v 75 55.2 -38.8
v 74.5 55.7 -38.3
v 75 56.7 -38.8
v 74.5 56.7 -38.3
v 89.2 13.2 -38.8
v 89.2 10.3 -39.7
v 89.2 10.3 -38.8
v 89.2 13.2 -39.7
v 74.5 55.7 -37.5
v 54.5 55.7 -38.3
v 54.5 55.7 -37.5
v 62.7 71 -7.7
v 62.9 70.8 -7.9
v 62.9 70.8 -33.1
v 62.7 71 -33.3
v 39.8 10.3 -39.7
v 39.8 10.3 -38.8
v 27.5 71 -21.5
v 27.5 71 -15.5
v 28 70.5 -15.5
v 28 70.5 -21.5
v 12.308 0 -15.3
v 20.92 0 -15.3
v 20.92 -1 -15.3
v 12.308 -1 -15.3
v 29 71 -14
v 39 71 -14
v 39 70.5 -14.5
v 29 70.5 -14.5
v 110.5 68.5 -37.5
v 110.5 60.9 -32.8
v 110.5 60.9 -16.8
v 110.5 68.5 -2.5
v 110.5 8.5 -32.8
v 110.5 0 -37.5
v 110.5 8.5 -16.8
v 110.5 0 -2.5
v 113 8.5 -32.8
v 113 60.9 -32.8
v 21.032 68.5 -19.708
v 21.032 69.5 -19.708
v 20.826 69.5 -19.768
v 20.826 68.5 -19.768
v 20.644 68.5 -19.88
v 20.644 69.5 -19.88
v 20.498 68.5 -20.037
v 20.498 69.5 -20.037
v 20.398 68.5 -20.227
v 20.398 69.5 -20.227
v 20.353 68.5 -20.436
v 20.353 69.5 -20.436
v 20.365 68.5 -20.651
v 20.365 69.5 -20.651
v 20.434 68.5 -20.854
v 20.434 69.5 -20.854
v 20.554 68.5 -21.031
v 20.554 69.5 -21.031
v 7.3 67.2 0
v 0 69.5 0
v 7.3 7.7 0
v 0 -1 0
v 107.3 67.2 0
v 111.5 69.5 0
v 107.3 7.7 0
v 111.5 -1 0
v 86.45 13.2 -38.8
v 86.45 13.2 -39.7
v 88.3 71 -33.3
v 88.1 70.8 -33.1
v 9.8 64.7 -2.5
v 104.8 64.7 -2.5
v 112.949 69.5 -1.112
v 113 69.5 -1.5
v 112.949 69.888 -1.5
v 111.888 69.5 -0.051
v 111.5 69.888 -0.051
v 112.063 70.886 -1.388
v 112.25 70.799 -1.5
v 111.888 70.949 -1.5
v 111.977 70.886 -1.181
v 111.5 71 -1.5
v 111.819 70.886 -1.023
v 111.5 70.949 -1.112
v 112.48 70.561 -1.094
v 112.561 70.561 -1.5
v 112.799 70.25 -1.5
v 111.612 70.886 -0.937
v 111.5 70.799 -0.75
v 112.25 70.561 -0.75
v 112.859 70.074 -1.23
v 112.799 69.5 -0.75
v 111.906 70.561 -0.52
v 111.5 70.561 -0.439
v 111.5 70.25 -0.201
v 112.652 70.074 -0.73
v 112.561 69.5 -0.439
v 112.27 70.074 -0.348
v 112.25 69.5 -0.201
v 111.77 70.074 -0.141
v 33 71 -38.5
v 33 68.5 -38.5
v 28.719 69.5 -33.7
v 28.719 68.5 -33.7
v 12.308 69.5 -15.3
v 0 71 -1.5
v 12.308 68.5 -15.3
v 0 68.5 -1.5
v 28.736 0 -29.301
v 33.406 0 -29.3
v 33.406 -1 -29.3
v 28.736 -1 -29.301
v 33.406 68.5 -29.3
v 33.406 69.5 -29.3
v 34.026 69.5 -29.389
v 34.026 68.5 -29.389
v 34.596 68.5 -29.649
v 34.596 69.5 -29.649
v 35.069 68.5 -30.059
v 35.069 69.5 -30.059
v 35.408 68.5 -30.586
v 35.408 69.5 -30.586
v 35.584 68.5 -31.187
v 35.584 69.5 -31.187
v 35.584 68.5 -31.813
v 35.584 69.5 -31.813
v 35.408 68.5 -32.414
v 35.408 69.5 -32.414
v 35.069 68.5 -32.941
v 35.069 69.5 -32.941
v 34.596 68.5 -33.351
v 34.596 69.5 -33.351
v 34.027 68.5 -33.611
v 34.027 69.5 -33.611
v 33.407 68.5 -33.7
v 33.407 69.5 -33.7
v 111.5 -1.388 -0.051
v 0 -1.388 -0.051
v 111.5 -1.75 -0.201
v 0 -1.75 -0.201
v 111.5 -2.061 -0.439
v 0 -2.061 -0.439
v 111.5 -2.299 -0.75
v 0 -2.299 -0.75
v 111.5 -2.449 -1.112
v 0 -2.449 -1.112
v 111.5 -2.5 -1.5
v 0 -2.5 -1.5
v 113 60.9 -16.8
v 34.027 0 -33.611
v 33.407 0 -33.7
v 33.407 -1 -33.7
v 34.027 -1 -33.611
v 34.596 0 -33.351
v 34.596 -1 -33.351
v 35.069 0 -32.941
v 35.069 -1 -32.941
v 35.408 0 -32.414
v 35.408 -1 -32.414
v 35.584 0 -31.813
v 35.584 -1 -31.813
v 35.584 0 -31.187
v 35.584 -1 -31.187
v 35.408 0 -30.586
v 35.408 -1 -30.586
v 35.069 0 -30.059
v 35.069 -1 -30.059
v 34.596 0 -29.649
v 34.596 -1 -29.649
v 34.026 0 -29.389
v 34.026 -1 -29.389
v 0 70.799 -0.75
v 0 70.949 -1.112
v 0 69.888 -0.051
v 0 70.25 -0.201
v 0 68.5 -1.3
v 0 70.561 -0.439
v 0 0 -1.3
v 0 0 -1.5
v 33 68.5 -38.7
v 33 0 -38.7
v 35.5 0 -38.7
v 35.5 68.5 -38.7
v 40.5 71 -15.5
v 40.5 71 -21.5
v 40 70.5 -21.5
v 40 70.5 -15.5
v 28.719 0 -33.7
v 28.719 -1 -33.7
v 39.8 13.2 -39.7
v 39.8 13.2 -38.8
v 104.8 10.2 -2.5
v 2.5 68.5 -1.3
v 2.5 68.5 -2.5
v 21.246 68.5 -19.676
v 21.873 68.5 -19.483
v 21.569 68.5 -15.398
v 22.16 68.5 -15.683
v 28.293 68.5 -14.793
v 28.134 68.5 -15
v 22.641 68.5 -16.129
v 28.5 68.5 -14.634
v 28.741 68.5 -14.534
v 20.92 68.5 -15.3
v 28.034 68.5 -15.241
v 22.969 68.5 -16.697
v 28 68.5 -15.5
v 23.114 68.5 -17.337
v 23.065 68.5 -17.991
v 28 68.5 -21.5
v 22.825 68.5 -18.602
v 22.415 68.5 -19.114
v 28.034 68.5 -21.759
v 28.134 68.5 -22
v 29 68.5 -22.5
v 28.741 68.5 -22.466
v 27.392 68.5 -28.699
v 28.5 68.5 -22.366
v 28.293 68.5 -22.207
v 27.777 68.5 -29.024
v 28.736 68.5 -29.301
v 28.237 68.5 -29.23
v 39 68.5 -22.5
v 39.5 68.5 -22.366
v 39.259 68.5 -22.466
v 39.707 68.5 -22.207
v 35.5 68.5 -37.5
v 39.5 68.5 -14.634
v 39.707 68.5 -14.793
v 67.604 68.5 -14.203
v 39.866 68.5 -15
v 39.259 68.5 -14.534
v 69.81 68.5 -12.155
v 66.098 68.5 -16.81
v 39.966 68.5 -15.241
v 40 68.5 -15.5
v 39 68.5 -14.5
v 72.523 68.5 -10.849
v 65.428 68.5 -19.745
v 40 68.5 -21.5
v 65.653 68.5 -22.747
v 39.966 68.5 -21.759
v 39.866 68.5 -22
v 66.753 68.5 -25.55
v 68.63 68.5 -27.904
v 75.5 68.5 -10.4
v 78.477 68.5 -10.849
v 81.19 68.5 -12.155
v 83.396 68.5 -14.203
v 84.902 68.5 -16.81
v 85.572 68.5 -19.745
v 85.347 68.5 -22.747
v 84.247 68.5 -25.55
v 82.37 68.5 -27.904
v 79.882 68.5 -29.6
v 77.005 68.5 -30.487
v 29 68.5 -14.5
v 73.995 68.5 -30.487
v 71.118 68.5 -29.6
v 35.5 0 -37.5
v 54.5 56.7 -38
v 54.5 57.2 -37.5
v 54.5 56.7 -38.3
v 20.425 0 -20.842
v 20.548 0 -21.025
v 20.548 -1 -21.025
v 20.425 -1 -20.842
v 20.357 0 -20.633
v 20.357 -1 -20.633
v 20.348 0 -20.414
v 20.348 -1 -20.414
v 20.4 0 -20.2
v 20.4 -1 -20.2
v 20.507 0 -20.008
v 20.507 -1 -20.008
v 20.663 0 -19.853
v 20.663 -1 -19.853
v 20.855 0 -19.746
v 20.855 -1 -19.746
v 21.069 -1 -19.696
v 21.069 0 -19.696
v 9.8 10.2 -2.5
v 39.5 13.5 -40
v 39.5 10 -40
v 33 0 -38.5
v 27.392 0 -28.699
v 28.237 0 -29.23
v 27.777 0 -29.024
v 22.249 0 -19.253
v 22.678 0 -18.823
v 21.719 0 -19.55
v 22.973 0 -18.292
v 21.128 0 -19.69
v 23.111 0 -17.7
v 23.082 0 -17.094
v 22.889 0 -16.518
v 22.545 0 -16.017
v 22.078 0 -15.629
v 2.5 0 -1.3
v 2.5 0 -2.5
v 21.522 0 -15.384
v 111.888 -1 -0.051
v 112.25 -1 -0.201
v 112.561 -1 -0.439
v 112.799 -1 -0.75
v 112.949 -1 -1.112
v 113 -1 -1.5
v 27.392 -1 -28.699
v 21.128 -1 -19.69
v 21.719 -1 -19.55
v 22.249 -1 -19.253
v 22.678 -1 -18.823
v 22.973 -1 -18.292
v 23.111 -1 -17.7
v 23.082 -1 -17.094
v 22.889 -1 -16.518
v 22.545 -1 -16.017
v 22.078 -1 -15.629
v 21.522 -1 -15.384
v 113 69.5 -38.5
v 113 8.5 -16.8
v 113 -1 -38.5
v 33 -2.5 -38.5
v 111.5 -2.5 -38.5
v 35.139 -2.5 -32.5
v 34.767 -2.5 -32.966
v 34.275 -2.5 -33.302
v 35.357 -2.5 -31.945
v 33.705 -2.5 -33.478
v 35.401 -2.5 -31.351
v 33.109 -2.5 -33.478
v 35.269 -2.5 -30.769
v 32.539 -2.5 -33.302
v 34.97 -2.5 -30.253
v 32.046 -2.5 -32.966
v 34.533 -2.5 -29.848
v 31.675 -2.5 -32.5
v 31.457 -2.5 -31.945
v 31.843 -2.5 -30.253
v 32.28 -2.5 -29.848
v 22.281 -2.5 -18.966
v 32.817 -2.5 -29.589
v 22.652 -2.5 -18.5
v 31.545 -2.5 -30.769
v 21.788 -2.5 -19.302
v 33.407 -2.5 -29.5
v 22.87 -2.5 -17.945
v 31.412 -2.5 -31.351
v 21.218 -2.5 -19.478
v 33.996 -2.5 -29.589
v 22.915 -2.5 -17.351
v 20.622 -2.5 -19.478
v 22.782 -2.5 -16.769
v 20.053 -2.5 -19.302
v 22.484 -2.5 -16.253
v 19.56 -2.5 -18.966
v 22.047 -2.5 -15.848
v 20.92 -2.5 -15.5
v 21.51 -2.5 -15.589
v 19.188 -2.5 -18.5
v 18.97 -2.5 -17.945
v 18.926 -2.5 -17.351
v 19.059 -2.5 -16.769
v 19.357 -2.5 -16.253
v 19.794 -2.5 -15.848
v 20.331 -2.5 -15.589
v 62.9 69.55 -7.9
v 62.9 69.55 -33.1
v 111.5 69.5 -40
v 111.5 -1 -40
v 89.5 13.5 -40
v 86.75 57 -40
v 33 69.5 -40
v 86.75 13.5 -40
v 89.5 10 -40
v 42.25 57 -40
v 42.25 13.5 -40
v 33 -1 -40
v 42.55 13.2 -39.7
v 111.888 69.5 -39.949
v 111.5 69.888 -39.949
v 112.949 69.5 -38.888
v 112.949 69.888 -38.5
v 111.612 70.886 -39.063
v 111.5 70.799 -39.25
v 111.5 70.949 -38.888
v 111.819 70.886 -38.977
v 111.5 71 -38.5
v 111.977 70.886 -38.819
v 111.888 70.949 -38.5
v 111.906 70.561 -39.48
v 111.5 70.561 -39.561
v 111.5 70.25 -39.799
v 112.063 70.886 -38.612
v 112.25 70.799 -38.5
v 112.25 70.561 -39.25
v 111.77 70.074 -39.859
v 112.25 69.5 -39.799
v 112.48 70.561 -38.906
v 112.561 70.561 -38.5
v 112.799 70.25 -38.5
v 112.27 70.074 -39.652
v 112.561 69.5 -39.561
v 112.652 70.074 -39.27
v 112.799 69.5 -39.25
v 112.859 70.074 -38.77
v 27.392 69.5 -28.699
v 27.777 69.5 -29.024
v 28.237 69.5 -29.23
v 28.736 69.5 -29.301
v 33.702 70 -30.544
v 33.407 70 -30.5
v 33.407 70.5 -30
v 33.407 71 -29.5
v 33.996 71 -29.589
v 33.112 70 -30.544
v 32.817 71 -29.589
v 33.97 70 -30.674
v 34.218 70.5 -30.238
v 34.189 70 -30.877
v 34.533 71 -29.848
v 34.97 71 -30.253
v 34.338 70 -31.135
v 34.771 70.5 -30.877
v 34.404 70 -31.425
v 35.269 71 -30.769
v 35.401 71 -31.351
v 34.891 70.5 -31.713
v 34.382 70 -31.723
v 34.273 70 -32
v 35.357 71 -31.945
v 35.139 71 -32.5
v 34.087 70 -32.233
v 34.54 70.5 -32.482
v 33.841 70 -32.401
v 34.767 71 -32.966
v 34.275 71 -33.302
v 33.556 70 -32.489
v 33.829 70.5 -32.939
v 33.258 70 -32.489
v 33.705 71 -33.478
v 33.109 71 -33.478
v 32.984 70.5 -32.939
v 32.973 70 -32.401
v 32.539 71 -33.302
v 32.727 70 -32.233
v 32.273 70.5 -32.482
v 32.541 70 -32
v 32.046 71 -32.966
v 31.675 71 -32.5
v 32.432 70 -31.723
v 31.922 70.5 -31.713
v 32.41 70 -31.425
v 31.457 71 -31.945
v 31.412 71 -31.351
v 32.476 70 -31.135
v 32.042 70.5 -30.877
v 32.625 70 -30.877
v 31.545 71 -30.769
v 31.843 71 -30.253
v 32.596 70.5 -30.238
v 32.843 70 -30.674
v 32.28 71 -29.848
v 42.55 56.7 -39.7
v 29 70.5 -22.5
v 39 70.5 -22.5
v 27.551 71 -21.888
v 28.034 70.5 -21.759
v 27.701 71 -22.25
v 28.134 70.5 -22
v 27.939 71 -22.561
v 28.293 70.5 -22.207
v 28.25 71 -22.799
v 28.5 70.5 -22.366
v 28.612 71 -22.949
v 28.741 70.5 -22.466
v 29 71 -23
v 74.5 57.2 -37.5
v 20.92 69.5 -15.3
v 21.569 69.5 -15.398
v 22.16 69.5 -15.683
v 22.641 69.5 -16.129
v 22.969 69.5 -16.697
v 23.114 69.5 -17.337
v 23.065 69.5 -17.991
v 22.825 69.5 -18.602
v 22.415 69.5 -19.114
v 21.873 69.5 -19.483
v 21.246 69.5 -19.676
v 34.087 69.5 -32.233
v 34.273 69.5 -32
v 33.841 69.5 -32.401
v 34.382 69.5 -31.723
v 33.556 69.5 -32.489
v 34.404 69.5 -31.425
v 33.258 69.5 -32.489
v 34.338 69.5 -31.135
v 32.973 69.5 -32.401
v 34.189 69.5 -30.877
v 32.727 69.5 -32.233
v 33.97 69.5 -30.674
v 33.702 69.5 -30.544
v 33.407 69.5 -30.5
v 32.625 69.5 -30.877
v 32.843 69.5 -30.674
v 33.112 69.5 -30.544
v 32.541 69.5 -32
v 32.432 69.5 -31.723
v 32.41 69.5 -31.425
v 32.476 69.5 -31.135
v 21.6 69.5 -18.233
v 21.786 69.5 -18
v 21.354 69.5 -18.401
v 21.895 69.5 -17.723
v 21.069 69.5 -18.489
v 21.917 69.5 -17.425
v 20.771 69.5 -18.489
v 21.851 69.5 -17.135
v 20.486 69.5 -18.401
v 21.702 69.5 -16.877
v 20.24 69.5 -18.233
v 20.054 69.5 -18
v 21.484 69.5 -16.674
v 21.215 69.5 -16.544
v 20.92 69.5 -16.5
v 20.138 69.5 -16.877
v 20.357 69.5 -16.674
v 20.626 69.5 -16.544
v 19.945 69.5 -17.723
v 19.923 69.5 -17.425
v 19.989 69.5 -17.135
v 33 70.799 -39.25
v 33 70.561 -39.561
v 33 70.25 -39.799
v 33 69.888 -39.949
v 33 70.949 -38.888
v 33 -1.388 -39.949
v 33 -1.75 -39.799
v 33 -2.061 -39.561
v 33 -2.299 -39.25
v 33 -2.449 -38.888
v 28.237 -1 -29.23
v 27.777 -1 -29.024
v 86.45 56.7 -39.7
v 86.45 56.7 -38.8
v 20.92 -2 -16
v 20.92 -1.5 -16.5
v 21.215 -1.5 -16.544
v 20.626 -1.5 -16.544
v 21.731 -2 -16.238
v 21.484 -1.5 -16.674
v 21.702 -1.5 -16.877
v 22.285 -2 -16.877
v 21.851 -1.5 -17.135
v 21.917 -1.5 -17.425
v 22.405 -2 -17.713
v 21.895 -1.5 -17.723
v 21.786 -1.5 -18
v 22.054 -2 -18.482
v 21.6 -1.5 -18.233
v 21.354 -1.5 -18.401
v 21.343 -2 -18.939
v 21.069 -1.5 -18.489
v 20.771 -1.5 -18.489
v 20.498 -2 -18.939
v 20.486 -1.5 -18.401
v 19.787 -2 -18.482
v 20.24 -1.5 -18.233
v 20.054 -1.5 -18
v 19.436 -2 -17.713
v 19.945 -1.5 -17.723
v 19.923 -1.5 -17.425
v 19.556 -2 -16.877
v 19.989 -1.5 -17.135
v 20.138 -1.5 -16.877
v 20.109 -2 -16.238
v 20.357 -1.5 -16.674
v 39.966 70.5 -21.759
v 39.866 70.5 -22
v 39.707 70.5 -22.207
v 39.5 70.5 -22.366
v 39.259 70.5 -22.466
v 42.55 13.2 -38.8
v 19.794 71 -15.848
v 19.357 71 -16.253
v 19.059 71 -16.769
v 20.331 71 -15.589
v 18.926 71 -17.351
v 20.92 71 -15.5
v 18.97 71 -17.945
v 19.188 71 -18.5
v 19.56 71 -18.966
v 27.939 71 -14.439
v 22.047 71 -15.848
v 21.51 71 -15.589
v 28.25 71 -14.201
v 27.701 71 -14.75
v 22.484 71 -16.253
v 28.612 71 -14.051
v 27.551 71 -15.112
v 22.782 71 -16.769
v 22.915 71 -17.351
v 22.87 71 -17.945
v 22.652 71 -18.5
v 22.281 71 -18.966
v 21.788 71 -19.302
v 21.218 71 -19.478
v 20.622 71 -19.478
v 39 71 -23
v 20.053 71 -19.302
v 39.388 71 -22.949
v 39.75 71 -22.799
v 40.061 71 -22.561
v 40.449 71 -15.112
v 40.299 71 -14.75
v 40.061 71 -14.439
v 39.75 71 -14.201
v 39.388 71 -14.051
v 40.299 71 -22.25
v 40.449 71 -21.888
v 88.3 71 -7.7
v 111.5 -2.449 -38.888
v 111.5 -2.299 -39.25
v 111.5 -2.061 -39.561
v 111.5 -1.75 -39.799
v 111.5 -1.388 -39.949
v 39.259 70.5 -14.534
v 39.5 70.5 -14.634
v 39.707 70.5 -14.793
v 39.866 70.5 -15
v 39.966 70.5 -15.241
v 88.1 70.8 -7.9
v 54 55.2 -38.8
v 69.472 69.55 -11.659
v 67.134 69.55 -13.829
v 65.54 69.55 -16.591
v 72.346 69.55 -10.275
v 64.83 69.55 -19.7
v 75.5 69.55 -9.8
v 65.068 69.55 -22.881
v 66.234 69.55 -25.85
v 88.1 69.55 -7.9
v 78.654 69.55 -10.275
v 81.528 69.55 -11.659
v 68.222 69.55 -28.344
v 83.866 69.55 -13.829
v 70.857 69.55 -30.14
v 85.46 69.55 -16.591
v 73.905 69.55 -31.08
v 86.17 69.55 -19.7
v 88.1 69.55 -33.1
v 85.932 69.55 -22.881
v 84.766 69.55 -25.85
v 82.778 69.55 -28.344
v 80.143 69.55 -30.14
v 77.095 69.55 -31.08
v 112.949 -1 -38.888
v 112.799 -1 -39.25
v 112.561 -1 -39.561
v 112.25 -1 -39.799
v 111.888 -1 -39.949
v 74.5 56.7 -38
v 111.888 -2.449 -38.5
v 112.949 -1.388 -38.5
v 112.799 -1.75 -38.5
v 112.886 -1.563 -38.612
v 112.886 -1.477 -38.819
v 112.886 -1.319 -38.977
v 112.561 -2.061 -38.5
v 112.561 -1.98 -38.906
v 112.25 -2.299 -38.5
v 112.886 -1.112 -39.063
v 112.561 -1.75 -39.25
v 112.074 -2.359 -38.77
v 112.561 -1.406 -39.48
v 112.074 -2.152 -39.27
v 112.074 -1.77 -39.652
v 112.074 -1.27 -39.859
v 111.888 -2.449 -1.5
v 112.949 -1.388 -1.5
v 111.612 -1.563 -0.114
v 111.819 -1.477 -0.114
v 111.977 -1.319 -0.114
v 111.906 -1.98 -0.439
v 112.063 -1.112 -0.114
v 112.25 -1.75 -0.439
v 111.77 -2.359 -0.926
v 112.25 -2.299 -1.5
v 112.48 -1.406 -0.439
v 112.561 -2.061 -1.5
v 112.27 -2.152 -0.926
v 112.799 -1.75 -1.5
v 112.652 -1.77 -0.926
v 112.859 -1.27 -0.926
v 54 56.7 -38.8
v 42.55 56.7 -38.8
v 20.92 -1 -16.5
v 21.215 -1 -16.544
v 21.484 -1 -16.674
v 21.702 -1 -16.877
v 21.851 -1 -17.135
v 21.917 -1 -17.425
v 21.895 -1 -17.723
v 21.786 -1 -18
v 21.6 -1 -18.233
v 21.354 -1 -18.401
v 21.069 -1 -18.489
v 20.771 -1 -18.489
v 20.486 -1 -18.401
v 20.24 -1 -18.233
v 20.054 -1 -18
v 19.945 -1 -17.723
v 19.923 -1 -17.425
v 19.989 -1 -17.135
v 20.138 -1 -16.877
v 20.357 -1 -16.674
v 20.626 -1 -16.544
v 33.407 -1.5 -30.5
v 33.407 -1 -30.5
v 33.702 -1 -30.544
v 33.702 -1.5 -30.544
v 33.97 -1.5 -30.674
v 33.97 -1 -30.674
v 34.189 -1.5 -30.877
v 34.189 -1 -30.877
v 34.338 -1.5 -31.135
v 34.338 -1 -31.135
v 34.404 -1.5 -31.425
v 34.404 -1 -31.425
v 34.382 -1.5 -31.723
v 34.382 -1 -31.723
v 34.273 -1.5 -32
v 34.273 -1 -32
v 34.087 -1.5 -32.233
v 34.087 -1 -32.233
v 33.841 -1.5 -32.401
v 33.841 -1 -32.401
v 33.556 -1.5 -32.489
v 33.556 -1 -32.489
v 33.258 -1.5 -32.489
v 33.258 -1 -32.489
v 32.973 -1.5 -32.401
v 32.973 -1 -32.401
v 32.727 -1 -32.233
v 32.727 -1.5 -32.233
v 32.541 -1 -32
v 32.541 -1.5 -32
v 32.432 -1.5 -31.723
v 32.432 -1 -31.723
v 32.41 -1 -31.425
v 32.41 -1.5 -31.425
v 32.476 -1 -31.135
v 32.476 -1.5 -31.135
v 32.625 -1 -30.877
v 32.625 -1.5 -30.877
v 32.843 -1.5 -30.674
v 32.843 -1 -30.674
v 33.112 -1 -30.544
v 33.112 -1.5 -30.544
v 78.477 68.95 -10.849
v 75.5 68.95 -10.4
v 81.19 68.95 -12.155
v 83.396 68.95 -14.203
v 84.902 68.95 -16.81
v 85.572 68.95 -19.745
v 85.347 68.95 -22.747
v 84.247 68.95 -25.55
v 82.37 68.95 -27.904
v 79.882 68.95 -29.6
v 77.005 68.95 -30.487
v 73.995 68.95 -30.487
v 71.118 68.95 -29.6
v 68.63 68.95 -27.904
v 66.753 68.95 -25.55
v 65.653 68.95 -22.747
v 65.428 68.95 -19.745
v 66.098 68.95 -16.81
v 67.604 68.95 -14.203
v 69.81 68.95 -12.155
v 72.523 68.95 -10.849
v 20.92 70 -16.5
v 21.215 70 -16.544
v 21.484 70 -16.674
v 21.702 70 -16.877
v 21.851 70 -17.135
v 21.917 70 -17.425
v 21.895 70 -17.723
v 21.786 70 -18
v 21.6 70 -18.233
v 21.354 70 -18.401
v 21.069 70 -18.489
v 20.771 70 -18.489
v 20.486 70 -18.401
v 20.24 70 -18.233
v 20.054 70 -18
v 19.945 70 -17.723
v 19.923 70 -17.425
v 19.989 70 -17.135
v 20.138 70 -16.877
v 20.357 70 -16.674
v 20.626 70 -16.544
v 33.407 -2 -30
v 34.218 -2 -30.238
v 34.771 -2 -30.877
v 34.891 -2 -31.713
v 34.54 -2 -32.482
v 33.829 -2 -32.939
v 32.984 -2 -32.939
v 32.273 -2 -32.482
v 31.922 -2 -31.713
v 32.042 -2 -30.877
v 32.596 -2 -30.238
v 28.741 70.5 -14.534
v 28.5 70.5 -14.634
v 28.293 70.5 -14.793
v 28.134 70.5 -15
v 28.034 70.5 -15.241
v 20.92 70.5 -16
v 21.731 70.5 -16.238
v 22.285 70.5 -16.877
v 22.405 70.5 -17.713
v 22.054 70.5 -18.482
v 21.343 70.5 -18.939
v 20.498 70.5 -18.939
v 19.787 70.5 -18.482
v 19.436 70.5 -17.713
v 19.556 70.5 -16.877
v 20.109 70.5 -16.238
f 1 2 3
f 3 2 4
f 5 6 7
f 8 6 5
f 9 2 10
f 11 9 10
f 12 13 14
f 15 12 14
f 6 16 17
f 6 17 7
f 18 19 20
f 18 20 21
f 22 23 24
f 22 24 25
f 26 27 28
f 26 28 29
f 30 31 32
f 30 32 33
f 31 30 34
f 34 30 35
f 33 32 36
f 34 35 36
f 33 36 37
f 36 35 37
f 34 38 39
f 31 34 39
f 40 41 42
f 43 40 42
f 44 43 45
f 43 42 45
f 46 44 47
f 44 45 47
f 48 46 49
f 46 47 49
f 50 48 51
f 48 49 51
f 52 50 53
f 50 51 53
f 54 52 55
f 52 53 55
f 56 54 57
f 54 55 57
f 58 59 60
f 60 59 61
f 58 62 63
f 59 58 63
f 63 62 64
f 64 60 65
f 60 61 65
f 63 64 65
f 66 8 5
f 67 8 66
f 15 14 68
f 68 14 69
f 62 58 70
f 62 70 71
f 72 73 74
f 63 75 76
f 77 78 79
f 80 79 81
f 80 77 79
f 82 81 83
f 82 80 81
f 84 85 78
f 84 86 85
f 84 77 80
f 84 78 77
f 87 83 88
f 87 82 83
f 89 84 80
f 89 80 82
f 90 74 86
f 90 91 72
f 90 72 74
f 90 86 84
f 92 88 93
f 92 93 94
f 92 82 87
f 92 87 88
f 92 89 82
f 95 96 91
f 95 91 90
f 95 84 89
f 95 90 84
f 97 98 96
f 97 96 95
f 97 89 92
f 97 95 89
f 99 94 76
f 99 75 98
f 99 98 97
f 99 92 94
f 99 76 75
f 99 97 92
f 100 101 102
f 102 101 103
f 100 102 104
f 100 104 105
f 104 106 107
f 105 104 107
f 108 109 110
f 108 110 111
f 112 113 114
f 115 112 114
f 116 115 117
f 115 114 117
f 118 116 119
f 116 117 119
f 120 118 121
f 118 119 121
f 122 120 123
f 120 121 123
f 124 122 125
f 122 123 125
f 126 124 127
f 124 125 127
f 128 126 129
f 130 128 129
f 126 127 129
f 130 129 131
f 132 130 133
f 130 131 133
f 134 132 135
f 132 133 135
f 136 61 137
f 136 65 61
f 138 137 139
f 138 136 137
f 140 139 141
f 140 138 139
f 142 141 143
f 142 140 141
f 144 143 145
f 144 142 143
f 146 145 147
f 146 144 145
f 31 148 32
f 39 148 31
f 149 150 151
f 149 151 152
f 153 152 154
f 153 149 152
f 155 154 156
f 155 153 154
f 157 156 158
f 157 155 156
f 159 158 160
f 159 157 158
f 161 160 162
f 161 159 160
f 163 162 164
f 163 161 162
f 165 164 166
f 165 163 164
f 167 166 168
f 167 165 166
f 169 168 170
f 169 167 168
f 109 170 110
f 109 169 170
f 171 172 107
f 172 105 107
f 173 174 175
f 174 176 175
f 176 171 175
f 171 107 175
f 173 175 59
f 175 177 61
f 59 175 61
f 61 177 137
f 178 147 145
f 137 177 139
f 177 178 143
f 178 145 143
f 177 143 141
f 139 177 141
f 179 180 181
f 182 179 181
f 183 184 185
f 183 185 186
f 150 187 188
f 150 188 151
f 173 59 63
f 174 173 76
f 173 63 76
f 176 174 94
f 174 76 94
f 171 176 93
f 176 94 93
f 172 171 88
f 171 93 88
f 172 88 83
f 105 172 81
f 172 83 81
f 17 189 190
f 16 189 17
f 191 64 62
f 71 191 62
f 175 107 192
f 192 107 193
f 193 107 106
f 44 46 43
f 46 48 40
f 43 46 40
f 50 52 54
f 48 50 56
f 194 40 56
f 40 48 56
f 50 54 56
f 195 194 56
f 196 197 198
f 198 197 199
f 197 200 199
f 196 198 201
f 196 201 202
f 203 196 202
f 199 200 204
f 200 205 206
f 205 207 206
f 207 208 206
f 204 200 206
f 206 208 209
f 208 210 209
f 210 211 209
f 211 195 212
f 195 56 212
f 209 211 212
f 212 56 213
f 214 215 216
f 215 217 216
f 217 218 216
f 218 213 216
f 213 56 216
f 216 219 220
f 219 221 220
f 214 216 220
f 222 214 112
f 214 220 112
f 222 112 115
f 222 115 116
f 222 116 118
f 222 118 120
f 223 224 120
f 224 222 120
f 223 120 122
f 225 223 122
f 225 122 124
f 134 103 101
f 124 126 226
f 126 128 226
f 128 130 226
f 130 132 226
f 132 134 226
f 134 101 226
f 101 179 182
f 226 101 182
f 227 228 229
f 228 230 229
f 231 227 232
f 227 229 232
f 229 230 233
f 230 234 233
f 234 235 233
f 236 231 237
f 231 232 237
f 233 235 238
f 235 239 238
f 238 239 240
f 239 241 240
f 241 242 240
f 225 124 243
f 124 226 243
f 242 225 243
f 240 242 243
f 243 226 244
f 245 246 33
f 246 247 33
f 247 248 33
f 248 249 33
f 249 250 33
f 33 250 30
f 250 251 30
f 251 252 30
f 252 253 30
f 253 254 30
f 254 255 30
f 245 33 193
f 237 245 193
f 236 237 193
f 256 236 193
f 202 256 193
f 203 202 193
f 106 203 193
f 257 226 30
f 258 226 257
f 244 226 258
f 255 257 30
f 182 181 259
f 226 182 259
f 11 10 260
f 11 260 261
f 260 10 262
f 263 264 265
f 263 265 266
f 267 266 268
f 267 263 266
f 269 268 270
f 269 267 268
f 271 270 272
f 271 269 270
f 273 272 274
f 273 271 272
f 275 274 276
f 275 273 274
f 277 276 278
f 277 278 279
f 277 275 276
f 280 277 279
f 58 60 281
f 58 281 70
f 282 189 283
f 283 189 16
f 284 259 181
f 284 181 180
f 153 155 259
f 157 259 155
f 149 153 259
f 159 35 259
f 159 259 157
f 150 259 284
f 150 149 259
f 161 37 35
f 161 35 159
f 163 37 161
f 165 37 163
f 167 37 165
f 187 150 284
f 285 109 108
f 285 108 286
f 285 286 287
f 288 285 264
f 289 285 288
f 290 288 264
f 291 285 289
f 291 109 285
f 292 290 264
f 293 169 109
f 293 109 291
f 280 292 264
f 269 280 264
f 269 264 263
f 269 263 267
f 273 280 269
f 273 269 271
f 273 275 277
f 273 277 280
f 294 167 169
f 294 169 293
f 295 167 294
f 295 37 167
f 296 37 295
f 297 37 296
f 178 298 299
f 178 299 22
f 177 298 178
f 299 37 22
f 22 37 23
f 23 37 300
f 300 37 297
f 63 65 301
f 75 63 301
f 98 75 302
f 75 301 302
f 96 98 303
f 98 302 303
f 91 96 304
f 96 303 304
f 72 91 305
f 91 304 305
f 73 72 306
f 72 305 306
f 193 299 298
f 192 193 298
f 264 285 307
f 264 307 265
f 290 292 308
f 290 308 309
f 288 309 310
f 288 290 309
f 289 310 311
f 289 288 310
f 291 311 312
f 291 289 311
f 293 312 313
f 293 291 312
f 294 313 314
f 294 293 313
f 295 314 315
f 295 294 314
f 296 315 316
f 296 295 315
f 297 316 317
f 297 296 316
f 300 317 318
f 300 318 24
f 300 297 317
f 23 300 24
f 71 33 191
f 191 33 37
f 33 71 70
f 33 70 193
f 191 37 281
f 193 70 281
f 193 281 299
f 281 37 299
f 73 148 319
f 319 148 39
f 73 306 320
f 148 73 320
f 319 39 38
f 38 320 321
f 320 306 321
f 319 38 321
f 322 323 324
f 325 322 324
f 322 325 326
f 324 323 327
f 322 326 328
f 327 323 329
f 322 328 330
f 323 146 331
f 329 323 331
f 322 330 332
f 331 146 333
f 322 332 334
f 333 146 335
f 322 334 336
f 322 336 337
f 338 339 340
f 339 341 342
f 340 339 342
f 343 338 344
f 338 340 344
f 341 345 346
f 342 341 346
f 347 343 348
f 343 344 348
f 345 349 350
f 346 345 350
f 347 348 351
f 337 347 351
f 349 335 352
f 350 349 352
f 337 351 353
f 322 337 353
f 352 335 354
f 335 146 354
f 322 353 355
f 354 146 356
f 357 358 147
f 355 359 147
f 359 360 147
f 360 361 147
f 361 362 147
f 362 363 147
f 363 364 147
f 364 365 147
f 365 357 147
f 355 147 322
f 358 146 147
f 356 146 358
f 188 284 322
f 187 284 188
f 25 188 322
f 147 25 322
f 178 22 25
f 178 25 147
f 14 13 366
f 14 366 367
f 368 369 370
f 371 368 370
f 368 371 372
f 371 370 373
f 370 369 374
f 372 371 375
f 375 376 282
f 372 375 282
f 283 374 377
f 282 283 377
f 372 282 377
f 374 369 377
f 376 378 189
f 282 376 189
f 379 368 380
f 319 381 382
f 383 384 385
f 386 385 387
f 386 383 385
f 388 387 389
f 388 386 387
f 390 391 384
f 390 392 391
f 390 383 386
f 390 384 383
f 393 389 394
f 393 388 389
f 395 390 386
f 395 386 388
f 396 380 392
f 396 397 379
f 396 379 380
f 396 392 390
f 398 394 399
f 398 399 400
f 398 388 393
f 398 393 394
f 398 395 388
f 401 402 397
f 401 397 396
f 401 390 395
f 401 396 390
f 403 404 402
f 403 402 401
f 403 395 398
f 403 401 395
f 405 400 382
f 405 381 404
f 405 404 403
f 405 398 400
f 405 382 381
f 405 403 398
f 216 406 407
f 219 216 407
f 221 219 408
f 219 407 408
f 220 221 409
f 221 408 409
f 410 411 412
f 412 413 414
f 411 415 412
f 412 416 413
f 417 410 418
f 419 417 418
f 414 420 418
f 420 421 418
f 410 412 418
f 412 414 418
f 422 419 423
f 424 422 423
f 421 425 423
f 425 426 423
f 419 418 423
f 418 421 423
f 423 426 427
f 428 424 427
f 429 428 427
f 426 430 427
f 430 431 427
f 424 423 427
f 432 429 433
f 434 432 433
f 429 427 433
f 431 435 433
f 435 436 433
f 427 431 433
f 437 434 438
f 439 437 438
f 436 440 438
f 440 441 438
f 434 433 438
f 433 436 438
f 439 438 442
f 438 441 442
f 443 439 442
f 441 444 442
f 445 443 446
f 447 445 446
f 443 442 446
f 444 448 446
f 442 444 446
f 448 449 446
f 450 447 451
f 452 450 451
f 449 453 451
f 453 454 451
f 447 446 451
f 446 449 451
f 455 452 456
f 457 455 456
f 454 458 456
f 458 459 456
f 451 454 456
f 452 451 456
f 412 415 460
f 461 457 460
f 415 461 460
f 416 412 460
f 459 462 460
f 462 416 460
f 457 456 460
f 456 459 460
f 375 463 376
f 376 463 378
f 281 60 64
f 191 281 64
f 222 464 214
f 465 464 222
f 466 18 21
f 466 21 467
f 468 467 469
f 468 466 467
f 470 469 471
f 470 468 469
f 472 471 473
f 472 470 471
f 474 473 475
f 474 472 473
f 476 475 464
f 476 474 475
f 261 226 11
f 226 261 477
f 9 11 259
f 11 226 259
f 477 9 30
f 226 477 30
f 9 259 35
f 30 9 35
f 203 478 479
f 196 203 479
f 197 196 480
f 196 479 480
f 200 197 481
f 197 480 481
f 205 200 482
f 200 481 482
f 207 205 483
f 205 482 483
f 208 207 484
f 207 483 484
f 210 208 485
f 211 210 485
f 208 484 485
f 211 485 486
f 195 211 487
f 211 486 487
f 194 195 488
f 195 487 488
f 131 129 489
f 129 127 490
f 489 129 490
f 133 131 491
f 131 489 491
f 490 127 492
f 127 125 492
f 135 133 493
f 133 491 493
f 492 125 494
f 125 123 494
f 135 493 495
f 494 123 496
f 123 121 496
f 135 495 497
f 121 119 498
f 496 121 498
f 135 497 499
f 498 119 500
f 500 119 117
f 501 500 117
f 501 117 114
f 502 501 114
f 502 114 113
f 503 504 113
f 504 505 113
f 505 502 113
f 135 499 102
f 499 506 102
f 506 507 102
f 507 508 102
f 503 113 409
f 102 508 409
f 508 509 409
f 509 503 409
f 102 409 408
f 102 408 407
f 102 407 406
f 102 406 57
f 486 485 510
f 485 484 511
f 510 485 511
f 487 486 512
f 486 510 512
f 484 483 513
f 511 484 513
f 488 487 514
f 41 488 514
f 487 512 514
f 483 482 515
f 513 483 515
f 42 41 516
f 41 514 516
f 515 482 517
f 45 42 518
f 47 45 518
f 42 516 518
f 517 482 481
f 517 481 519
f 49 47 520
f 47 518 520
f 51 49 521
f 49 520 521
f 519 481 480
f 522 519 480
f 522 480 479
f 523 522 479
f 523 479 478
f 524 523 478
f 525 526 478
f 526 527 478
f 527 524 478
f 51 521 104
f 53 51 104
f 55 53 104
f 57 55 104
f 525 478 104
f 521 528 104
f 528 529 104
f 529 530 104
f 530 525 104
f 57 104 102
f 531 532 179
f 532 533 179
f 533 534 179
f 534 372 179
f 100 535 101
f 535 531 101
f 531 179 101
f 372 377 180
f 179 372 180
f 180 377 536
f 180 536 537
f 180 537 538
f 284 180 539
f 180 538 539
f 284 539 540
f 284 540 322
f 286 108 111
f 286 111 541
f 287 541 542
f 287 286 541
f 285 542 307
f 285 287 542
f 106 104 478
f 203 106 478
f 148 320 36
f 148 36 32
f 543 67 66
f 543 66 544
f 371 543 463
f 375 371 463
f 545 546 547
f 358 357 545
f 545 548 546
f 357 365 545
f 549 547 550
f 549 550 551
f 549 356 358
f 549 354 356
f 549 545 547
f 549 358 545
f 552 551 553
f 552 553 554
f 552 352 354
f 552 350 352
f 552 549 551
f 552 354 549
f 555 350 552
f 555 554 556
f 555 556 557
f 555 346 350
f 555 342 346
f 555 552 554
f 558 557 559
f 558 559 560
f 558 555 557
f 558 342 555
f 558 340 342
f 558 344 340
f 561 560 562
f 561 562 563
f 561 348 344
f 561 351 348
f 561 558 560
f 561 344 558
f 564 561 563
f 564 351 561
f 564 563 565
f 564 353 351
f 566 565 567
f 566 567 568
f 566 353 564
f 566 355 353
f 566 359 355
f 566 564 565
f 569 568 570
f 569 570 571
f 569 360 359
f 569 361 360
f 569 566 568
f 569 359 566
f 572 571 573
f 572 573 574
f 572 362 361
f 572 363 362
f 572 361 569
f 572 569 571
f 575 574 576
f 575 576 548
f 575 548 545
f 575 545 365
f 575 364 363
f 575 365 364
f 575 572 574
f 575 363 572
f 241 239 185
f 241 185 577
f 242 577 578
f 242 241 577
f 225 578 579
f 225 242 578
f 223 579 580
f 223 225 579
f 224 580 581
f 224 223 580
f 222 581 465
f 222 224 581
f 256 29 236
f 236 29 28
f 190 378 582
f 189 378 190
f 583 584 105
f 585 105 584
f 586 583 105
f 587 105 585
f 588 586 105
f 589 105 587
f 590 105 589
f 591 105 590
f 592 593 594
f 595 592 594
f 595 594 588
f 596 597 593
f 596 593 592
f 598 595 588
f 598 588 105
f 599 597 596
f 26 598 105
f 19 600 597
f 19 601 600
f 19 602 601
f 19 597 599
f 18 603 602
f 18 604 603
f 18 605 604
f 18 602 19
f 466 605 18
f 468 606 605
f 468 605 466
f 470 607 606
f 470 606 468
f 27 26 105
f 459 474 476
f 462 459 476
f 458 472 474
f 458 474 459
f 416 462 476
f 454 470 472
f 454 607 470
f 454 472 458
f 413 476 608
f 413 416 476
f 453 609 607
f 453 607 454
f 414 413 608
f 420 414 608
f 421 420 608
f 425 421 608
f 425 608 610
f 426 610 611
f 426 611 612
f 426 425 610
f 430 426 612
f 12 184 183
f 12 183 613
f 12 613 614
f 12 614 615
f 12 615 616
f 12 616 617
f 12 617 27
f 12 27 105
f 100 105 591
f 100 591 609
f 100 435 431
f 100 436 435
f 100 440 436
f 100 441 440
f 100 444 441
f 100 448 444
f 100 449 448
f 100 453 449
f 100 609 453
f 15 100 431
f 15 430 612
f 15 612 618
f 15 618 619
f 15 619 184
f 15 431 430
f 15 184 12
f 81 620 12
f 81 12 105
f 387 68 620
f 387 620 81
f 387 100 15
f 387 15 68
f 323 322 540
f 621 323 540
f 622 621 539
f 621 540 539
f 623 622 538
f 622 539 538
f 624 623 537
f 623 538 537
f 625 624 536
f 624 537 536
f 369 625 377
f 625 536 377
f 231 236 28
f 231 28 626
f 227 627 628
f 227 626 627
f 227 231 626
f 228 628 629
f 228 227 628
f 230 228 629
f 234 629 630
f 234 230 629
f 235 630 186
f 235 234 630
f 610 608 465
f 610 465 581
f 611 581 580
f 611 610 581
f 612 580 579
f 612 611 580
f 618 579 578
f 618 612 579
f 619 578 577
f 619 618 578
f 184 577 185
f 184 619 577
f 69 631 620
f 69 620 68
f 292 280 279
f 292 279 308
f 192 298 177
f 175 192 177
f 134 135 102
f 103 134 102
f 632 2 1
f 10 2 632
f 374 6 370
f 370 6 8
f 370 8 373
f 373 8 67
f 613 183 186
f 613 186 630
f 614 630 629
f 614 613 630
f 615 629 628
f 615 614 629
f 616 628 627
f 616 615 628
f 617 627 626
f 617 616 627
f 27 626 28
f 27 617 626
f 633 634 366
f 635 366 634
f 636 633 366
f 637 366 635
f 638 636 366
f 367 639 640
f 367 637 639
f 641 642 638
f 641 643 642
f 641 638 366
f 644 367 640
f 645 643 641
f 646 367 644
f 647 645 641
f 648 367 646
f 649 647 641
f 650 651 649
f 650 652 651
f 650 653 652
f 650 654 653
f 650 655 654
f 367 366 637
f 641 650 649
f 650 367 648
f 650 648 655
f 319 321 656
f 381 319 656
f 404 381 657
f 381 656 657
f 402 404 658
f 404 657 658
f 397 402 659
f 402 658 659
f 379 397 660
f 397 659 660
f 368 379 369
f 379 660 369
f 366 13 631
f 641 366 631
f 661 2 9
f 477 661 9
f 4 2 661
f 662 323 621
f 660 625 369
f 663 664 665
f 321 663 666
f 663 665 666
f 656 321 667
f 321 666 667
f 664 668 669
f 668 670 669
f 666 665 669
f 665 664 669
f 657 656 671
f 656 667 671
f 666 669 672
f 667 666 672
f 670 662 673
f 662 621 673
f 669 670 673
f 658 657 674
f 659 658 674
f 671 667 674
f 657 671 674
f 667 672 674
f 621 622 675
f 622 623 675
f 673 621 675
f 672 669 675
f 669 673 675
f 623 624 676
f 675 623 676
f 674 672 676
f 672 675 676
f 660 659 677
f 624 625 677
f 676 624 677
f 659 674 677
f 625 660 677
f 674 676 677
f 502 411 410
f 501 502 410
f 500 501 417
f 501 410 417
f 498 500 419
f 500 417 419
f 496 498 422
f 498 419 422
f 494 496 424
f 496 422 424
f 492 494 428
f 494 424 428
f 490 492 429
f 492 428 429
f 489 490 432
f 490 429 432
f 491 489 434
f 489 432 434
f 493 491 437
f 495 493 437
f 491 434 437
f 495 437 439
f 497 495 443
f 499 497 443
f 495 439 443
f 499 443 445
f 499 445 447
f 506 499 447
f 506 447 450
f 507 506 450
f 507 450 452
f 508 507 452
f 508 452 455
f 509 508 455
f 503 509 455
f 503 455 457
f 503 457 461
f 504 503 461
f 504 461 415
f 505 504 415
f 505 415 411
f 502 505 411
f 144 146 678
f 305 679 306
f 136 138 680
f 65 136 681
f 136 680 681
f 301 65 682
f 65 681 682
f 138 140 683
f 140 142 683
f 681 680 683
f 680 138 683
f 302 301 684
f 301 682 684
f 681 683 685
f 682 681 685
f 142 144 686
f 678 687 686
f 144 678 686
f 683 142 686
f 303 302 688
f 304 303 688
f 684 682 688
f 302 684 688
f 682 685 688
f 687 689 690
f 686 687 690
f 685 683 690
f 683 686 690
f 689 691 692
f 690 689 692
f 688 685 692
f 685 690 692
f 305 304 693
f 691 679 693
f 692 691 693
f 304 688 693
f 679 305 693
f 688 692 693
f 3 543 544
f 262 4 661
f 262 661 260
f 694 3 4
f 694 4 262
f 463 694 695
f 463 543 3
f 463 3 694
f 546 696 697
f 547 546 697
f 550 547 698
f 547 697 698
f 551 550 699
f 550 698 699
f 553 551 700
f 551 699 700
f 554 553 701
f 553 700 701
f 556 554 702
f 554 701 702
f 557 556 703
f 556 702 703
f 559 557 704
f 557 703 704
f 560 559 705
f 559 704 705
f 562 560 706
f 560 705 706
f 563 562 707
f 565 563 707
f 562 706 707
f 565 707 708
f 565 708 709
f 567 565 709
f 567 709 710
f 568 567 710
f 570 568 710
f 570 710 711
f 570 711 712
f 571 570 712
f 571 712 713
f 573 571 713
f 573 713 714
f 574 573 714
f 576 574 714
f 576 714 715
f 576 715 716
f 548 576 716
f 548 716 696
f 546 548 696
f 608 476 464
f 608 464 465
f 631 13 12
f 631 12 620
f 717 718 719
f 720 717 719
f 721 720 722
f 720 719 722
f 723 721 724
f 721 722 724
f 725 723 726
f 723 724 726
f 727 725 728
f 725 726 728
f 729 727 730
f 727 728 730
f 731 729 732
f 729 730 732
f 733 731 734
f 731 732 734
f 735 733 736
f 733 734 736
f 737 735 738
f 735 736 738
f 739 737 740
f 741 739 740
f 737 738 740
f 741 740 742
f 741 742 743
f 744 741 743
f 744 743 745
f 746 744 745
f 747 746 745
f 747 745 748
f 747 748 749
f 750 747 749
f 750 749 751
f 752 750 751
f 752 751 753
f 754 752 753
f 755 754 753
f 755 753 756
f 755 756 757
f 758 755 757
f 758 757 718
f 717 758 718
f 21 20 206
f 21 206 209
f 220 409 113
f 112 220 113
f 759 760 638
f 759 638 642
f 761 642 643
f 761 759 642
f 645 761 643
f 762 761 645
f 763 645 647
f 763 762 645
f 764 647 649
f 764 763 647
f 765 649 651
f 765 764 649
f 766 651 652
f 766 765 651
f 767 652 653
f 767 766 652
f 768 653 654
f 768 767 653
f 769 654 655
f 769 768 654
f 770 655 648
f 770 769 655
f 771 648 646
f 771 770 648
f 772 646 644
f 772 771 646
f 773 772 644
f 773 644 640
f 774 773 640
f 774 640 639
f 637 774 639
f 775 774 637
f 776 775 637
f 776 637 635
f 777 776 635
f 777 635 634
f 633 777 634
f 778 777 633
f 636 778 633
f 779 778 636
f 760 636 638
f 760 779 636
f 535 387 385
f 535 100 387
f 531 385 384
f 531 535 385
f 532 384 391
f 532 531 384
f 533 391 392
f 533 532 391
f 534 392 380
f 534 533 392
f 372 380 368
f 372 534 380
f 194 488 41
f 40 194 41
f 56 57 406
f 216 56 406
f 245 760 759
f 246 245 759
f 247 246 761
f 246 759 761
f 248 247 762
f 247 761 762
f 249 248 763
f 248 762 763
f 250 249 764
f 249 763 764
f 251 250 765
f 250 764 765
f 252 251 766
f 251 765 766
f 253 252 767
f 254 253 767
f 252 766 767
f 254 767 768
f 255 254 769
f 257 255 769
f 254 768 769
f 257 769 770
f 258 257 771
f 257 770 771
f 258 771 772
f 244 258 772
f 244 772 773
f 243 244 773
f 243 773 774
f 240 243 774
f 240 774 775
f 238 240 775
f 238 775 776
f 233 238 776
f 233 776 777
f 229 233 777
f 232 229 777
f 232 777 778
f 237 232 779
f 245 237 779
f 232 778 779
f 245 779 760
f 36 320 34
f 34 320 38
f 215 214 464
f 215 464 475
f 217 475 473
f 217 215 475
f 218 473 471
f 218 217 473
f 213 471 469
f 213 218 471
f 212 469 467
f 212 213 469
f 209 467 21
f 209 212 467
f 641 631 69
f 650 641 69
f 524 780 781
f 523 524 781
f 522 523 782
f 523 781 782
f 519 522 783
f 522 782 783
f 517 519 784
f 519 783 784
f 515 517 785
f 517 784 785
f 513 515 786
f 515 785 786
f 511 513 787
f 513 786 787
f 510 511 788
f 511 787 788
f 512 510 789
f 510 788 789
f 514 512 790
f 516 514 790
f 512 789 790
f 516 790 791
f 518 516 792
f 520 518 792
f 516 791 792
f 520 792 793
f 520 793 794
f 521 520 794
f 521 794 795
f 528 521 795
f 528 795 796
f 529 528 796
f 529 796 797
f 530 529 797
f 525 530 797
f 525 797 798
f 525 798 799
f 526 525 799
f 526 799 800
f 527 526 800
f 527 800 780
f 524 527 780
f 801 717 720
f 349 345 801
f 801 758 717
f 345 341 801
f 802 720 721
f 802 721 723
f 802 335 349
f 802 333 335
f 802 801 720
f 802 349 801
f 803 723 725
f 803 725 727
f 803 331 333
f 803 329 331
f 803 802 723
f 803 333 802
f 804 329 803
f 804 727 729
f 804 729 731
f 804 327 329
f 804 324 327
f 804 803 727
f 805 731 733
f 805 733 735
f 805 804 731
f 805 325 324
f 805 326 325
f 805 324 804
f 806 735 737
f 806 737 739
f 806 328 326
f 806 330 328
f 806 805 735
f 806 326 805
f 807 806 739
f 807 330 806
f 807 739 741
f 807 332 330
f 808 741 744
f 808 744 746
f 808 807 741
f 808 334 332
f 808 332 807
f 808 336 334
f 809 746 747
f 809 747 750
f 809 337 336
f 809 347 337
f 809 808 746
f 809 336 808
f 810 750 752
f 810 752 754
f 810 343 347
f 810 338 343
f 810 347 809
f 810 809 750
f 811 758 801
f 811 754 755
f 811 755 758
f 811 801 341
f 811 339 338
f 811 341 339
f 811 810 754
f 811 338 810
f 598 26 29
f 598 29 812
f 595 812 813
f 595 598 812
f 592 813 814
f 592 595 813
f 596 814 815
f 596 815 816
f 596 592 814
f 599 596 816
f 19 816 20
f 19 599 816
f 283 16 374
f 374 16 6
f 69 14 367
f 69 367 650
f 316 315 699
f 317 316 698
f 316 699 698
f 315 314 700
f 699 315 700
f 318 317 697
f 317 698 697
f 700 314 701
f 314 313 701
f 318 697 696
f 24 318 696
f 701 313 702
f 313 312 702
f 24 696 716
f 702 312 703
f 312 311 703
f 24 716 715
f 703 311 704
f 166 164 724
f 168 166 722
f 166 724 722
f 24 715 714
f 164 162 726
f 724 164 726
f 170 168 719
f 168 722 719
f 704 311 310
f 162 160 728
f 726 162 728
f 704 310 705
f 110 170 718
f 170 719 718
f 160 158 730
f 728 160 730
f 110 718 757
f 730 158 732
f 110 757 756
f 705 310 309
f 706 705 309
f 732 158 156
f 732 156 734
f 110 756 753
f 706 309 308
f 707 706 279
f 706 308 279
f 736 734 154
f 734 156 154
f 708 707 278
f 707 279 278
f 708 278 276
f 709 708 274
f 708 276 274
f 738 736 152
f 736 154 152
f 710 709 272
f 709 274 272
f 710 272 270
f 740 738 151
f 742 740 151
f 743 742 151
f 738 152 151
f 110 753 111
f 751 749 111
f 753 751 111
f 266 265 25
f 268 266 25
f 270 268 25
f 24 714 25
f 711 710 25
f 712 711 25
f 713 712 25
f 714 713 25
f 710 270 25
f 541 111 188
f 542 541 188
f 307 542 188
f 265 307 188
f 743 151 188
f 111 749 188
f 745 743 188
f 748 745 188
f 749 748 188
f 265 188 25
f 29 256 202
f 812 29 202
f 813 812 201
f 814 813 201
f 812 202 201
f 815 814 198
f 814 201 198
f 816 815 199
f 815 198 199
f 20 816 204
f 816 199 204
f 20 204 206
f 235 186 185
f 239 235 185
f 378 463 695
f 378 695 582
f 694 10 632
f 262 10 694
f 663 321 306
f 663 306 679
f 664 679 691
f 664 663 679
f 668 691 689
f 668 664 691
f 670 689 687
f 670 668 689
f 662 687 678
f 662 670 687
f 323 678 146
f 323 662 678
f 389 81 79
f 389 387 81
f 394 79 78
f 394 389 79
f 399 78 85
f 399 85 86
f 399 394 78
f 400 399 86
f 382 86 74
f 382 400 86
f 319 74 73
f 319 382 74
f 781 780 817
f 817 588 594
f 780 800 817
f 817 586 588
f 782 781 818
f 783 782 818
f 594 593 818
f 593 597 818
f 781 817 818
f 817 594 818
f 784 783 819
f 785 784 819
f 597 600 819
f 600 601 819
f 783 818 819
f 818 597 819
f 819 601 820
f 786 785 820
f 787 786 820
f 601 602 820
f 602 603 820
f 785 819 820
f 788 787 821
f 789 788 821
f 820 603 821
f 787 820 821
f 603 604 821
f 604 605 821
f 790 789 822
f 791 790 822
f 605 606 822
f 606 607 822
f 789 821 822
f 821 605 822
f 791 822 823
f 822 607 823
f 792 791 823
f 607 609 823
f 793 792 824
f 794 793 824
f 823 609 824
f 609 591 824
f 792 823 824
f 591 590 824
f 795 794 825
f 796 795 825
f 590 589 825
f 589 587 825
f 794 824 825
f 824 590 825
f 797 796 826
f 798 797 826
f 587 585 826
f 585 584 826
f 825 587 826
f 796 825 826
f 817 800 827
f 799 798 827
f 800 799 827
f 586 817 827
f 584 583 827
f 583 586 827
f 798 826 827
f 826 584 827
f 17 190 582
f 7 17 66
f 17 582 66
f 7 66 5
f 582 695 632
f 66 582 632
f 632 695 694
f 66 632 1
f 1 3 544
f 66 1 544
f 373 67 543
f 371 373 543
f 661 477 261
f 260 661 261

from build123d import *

# Parameters (mm, degrees)
BOSS_EXTRU_1_DEPTH       = 68.5
BOSS_EXTRU_2_DEPTH       = 2.5
ESQUISSE4_W              = 95
ESQUISSE4_H              = 54.5
ENL_V_MAT_EXTRU_1_DEPTH  = 2.5
ESQUISSE5_W              = 16
ESQUISSE5_H              = 52.4
ENL_V_MAT_EXTRU_2_DEPTH  = 2.5
BOSS_EXTRU_3_DEPTH       = 2.5
CHANFREIN1_SIZE          = 2.5
CONG_1_R                 = 1.5
ENL_V_MAT_EXTRU_3_DEPTH  = 1.2
CHANFREIN2_SIZE          = 0.3
ESQUISSE8_W              = 20
ESQUISSE8_H              = 1
ENL_V_MAT_EXTRU_4_DEPTH  = 3
CHANFREIN3_SIZE          = 0.5
CHANFREIN4_SIZE          = 0.5
ESQUISSE9_R              = 1
ENL_V_MAT_EXTRU_5_DEPTH  = 75
CHANFREIN5_SIZE          = 1
CHANFREIN6_SIZE          = 1
ENL_V_MAT_EXTRU_6_DEPTH  = 1
ENL_V_START              = -1
ENL_V_MAT_EXTRU_7_DEPTH  = 1
ESQUISSE13_W             = 12
ESQUISSE13_H             = 8
ENL_V_MAT_EXTRU_8_DEPTH  = 2.5
CONG_2_R                 = 1
CHANFREIN7_SIZE          = 0.5
ESQUISSE14_W             = 25.2
ESQUISSE14_H             = 25.2
ENL_V_MAT_EXTRU_9_DEPTH  = 1.45
CHANFREIN8_SIZE          = 0.2
ESQUISSE15_R             = 10.1
ENL_V_MAT_EXTRU_10_DEPTH = 1.05
CHANFREIN9_SIZE          = 0.6


with BuildPart() as part:
    # Esquisse2 → Boss.-Extru.1 (new body)
    with BuildSketch(Plane(origin=(0, 0, 0), x_dir=(1, 0, 0), z_dir=(0, 1, 0))):
        Polygon((0, 0), (113, 0), (113, 40), (33, 40), (33, 38.7), (35.5, 38.7), (35.5, 37.5), (110.5, 37.5), (110.5, 2.5), (2.5, 2.5), (2.5, 1.3), (0, 1.3), align=None)
    extrude(amount=BOSS_EXTRU_1_DEPTH)

    # Esquisse3 → Boss.-Extru.2 (add)
    with BuildSketch(Plane.XZ):
        Polygon((0, 0), (113, 0), (113, -40), (33, -40), (33, -38.5), (0, -1.5), align=None)
    extrude(amount=BOSS_EXTRU_2_DEPTH)

    # Esquisse4 → Enlèv. mat.-Extru.1 (cut)
    with BuildSketch(Plane.XY):
        with Locations((57.3, 37.45)):
            Rectangle(ESQUISSE4_W, ESQUISSE4_H)
    extrude(amount=-ENL_V_MAT_EXTRU_1_DEPTH, mode=Mode.SUBTRACT)

    # Esquisse5 → Enlèv. mat.-Extru.2 (cut)
    with BuildSketch(Plane(origin=(113, 0, 0), x_dir=(0, 0, -1), z_dir=(1, 0, 0))):
        with Locations((24.8, 34.7)):
            Rectangle(ESQUISSE5_W, ESQUISSE5_H)
    extrude(amount=-ENL_V_MAT_EXTRU_2_DEPTH, mode=Mode.SUBTRACT)

    # Esquisse6 → Boss.-Extru.3 (add)
    with BuildSketch(Plane(origin=(0, 68.5, 0), x_dir=(1, 0, 0), z_dir=(0, 1, 0))):
        Polygon((33, 40), (33, 38.5), (0, 1.5), (0, 0), (113, 0), (113, 40), align=None)
    extrude(amount=BOSS_EXTRU_3_DEPTH)

    # Chanfrein1
    chanfrein1_edges = [part.edges().sort_by_distance(p)[0] for p in [
        (57.3, 10.2, 0),
        (104.8, 37.45, 0),
        (57.3, 64.7, 0),
        (9.8, 37.45, 0),
    ]]
    chamfer(chanfrein1_edges, length=CHANFREIN1_SIZE - 0.0001)  # a hair under: the kernel refuses the full size

    # Congé1
    cong_1_edges = [part.edges().sort_by_distance(p)[0] for p in [
        (73, -2.5, -40),
        (113, -2.5, -20),
        (113, 34.25, -40),
        (56.5, -2.5, 0),
        (113, 34.25, 0),
        (73, 71, -40),
        (113, 71, -20),
        (56.5, 71, 0),
    ]]
    fillet(cong_1_edges, radius=CONG_1_R)

    # Esquisse7 → Enlèv. mat.-Extru.3 (cut)
    with BuildSketch(Plane(origin=(0, 0, -40), x_dir=(-1, 0, 0), z_dir=(0, 0, -1))):
        Polygon((-86.45, 56.7), (-42.55, 56.7), (-42.55, 13.2), (-39.8, 13.2), (-39.8, 10.3), (-89.2, 10.3), (-89.2, 13.2), (-86.45, 13.2), align=None)
    extrude(amount=-ENL_V_MAT_EXTRU_3_DEPTH, mode=Mode.SUBTRACT)

    # Chanfrein2
    chanfrein2_edges = [part.edges().sort_by_distance(p)[0] for p in [
        (86.45, 34.95, -40),
        (87.825, 13.2, -40),
        (89.2, 11.75, -40),
        (64.5, 10.3, -40),
        (39.8, 11.75, -40),
        (41.175, 13.2, -40),
        (42.55, 34.95, -40),
        (64.5, 56.7, -40),
    ]]
    chamfer(chanfrein2_edges, length=CHANFREIN2_SIZE)

    # Esquisse8 → Enlèv. mat.-Extru.4 (cut)
    with BuildSketch(Plane(origin=(0, 0, -38.8), x_dir=(-1, 0, 0), z_dir=(0, 0, -1))):
        with Locations((-64.5, 56.2)):
            Rectangle(ESQUISSE8_W, ESQUISSE8_H)
    extrude(amount=-ENL_V_MAT_EXTRU_4_DEPTH, mode=Mode.SUBTRACT)

    # Chanfrein3
    chanfrein3_edges = [part.edges().sort_by_distance(p)[0] for p in [
        (74.5, 56.2, -38.8),
        (64.5, 55.7, -38.8),
        (54.5, 56.2, -38.8),
    ]]
    chamfer(chanfrein3_edges, length=CHANFREIN3_SIZE)

    # Chanfrein4
    chanfrein4_edges = [part.edges().sort_by_distance(p)[0] for p in [
        (64.5, 56.7, -37.5),
    ]]
    chamfer(chanfrein4_edges, length=CHANFREIN4_SIZE)

    # Esquisse9 → Enlèv. mat.-Extru.5 (cut)
    with BuildSketch(Plane(origin=(0, 71, 0), x_dir=(1, 0, 0), z_dir=(0, 1, 0))):
        with Locations(Location((20.92027027, 17.5, 0), (0, 0, 270))):
            Circle(ESQUISSE9_R)
        with Locations(Location((33.406756757, 31.5, 0), (0, 0, 270))):
            Circle(ESQUISSE9_R)
    extrude(amount=-ENL_V_MAT_EXTRU_5_DEPTH, mode=Mode.SUBTRACT)

    # Chanfrein5
    chanfrein5_edges = [part.edges().sort_by_distance(p)[0] for p in [
        (20.92027027, 71, -18.5),
        (33.406756757, 71, -32.5),
    ]]
    chamfer(chanfrein5_edges, length=CHANFREIN5_SIZE)

    # Chanfrein6
    chanfrein6_edges = [part.edges().sort_by_distance(p)[0] for p in [
        (20.92027027, -2.5, -18.5),
        (33.406756757, -2.5, -32.5),
    ]]
    chamfer(chanfrein6_edges, length=CHANFREIN6_SIZE)

    # Esquisse10 → Enlèv. mat.-Extru.6 (cut)
    with BuildSketch(Plane(origin=(0, 0, 0), x_dir=(1, 0, 0), z_dir=(0, 1, 0))):
        with BuildLine():
            Line((12.040050277, 15.299924377), (28.450890894, 33.699957797))
            Line((28.450890894, 33.699957797), (33.406738022, 33.7))
            ThreePointArc((33.406738022, 33.7), (35.606756752, 31.499854993), (33.406448008, 29.300000022))
            Line((33.406448008, 29.300000022), (28.735619265, 29.300655526))
            ThreePointArc((28.735619265, 29.300655526), (27.99947652, 29.143356281), (27.392034871, 28.698762269))
            Line((27.392034871, 28.698762269), (20.547584791, 21.024681875))
            ThreePointArc((20.547584791, 21.024681875), (20.399896986, 20.199981277), (21.069011886, 19.695770987))
            Line((21.069011886, 19.695770987), (21.128195715, 19.69015228))
            ThreePointArc((21.128195715, 19.69015228), (23.117807404, 17.395930099), (20.920289005, 15.3))
            Line((20.920289005, 15.3), (12.040050277, 15.299924377))
        make_face()
    extrude(amount=-ENL_V_MAT_EXTRU_6_DEPTH, mode=Mode.SUBTRACT)

    # Esquisse12 → Enlèv. mat.-Extru.7 (cut)
    with BuildSketch(Plane.XZ.offset(-68.5).offset(ENL_V_START)):
        with BuildLine():
            Line((12.308108108, -15.3), (20.92027027, -15.3))
            ThreePointArc((20.92027027, -15.3), (23.11421416, -17.336873648), (21.245624873, -19.675808903))
            Line((21.245624873, -19.675808903), (21.03224488, -19.707716192))
            ThreePointArc((21.03224488, -19.707716192), (20.398241002, -20.226848336), (20.553531675, -21.031425186))
            Line((20.553531675, -21.031425186), (27.392315335, -28.698793496))
            ThreePointArc((27.392315335, -28.698793496), (27.999748232, -29.143364838), (28.735871891, -29.300655526))
            Line((28.735871891, -29.300655526), (33.406447992, -29.300000022))
            ThreePointArc((33.406447992, -29.300000022), (35.606756752, -31.499854985), (33.406738022, -33.7))
            Line((33.406738022, -33.7), (28.718883313, -33.699960079))
            Line((28.718883313, -33.699960079), (12.308108108, -15.3))
        make_face()
    extrude(amount=ENL_V_MAT_EXTRU_7_DEPTH, mode=Mode.SUBTRACT)

    # Esquisse13 → Enlèv. mat.-Extru.8 (cut)
    with BuildSketch(Plane(origin=(0, 71, 0), x_dir=(1, 0, 0), z_dir=(0, 1, 0))):
        with Locations((34, 18.5)):
            Rectangle(ESQUISSE13_W, ESQUISSE13_H)
    extrude(amount=-ENL_V_MAT_EXTRU_8_DEPTH, mode=Mode.SUBTRACT)

    # Congé2
    cong_2_edges = [part.edges().sort_by_distance(p)[0] for p in [
        (28, 69.75, -14.5),
        (28, 69.75, -22.5),
        (40, 69.75, -22.5),
        (40, 69.75, -14.5),
    ]]
    fillet(cong_2_edges, radius=CONG_2_R)

    # Chanfrein7
    chanfrein7_edges = [part.edges().sort_by_distance(p)[0] for p in [
        (28, 71, -18.5),
        (34, 71, -22.5),
        (40, 71, -18.5),
        (34, 71, -14.5),
        (28.292893219, 71, -22.207106781),
        (39.707106781, 71, -22.207106781),
        (39.707106781, 71, -14.792893219),
        (28.292893219, 71, -14.792893219),
    ]]
    chamfer(chanfrein7_edges, length=CHANFREIN7_SIZE)

    # Esquisse14 → Enlèv. mat.-Extru.9 (cut)
    with BuildSketch(Plane(origin=(0, 71, 0), x_dir=(1, 0, 0), z_dir=(0, 1, 0))):
        with Locations((75.5, 20.5)):
            Rectangle(ESQUISSE14_W, ESQUISSE14_H)
    extrude(amount=-ENL_V_MAT_EXTRU_9_DEPTH, mode=Mode.SUBTRACT)

    # Chanfrein8
    chanfrein8_edges = [part.edges().sort_by_distance(p)[0] for p in [
        (62.9, 71, -20.5),
        (75.5, 71, -7.9),
        (88.1, 71, -20.5),
        (75.5, 71, -33.1),
    ]]
    chamfer(chanfrein8_edges, length=CHANFREIN8_SIZE)

    # Esquisse15 → Enlèv. mat.-Extru.10 (cut)
    with BuildSketch(Plane(origin=(0, 69.55, 0), x_dir=(1, 0, 0), z_dir=(0, 1, 0))):
        with Locations(Location((75.5, 20.5, 0), (0, 0, 270))):
            Circle(ESQUISSE15_R)
    extrude(amount=-ENL_V_MAT_EXTRU_10_DEPTH, mode=Mode.SUBTRACT)

    # Chanfrein9
    chanfrein9_edges = [part.edges().sort_by_distance(p)[0] for p in [
        (75.5, 69.55, -30.6),
    ]]
    chamfer(chanfrein9_edges, length=CHANFREIN9_SIZE)


solid = part.part
